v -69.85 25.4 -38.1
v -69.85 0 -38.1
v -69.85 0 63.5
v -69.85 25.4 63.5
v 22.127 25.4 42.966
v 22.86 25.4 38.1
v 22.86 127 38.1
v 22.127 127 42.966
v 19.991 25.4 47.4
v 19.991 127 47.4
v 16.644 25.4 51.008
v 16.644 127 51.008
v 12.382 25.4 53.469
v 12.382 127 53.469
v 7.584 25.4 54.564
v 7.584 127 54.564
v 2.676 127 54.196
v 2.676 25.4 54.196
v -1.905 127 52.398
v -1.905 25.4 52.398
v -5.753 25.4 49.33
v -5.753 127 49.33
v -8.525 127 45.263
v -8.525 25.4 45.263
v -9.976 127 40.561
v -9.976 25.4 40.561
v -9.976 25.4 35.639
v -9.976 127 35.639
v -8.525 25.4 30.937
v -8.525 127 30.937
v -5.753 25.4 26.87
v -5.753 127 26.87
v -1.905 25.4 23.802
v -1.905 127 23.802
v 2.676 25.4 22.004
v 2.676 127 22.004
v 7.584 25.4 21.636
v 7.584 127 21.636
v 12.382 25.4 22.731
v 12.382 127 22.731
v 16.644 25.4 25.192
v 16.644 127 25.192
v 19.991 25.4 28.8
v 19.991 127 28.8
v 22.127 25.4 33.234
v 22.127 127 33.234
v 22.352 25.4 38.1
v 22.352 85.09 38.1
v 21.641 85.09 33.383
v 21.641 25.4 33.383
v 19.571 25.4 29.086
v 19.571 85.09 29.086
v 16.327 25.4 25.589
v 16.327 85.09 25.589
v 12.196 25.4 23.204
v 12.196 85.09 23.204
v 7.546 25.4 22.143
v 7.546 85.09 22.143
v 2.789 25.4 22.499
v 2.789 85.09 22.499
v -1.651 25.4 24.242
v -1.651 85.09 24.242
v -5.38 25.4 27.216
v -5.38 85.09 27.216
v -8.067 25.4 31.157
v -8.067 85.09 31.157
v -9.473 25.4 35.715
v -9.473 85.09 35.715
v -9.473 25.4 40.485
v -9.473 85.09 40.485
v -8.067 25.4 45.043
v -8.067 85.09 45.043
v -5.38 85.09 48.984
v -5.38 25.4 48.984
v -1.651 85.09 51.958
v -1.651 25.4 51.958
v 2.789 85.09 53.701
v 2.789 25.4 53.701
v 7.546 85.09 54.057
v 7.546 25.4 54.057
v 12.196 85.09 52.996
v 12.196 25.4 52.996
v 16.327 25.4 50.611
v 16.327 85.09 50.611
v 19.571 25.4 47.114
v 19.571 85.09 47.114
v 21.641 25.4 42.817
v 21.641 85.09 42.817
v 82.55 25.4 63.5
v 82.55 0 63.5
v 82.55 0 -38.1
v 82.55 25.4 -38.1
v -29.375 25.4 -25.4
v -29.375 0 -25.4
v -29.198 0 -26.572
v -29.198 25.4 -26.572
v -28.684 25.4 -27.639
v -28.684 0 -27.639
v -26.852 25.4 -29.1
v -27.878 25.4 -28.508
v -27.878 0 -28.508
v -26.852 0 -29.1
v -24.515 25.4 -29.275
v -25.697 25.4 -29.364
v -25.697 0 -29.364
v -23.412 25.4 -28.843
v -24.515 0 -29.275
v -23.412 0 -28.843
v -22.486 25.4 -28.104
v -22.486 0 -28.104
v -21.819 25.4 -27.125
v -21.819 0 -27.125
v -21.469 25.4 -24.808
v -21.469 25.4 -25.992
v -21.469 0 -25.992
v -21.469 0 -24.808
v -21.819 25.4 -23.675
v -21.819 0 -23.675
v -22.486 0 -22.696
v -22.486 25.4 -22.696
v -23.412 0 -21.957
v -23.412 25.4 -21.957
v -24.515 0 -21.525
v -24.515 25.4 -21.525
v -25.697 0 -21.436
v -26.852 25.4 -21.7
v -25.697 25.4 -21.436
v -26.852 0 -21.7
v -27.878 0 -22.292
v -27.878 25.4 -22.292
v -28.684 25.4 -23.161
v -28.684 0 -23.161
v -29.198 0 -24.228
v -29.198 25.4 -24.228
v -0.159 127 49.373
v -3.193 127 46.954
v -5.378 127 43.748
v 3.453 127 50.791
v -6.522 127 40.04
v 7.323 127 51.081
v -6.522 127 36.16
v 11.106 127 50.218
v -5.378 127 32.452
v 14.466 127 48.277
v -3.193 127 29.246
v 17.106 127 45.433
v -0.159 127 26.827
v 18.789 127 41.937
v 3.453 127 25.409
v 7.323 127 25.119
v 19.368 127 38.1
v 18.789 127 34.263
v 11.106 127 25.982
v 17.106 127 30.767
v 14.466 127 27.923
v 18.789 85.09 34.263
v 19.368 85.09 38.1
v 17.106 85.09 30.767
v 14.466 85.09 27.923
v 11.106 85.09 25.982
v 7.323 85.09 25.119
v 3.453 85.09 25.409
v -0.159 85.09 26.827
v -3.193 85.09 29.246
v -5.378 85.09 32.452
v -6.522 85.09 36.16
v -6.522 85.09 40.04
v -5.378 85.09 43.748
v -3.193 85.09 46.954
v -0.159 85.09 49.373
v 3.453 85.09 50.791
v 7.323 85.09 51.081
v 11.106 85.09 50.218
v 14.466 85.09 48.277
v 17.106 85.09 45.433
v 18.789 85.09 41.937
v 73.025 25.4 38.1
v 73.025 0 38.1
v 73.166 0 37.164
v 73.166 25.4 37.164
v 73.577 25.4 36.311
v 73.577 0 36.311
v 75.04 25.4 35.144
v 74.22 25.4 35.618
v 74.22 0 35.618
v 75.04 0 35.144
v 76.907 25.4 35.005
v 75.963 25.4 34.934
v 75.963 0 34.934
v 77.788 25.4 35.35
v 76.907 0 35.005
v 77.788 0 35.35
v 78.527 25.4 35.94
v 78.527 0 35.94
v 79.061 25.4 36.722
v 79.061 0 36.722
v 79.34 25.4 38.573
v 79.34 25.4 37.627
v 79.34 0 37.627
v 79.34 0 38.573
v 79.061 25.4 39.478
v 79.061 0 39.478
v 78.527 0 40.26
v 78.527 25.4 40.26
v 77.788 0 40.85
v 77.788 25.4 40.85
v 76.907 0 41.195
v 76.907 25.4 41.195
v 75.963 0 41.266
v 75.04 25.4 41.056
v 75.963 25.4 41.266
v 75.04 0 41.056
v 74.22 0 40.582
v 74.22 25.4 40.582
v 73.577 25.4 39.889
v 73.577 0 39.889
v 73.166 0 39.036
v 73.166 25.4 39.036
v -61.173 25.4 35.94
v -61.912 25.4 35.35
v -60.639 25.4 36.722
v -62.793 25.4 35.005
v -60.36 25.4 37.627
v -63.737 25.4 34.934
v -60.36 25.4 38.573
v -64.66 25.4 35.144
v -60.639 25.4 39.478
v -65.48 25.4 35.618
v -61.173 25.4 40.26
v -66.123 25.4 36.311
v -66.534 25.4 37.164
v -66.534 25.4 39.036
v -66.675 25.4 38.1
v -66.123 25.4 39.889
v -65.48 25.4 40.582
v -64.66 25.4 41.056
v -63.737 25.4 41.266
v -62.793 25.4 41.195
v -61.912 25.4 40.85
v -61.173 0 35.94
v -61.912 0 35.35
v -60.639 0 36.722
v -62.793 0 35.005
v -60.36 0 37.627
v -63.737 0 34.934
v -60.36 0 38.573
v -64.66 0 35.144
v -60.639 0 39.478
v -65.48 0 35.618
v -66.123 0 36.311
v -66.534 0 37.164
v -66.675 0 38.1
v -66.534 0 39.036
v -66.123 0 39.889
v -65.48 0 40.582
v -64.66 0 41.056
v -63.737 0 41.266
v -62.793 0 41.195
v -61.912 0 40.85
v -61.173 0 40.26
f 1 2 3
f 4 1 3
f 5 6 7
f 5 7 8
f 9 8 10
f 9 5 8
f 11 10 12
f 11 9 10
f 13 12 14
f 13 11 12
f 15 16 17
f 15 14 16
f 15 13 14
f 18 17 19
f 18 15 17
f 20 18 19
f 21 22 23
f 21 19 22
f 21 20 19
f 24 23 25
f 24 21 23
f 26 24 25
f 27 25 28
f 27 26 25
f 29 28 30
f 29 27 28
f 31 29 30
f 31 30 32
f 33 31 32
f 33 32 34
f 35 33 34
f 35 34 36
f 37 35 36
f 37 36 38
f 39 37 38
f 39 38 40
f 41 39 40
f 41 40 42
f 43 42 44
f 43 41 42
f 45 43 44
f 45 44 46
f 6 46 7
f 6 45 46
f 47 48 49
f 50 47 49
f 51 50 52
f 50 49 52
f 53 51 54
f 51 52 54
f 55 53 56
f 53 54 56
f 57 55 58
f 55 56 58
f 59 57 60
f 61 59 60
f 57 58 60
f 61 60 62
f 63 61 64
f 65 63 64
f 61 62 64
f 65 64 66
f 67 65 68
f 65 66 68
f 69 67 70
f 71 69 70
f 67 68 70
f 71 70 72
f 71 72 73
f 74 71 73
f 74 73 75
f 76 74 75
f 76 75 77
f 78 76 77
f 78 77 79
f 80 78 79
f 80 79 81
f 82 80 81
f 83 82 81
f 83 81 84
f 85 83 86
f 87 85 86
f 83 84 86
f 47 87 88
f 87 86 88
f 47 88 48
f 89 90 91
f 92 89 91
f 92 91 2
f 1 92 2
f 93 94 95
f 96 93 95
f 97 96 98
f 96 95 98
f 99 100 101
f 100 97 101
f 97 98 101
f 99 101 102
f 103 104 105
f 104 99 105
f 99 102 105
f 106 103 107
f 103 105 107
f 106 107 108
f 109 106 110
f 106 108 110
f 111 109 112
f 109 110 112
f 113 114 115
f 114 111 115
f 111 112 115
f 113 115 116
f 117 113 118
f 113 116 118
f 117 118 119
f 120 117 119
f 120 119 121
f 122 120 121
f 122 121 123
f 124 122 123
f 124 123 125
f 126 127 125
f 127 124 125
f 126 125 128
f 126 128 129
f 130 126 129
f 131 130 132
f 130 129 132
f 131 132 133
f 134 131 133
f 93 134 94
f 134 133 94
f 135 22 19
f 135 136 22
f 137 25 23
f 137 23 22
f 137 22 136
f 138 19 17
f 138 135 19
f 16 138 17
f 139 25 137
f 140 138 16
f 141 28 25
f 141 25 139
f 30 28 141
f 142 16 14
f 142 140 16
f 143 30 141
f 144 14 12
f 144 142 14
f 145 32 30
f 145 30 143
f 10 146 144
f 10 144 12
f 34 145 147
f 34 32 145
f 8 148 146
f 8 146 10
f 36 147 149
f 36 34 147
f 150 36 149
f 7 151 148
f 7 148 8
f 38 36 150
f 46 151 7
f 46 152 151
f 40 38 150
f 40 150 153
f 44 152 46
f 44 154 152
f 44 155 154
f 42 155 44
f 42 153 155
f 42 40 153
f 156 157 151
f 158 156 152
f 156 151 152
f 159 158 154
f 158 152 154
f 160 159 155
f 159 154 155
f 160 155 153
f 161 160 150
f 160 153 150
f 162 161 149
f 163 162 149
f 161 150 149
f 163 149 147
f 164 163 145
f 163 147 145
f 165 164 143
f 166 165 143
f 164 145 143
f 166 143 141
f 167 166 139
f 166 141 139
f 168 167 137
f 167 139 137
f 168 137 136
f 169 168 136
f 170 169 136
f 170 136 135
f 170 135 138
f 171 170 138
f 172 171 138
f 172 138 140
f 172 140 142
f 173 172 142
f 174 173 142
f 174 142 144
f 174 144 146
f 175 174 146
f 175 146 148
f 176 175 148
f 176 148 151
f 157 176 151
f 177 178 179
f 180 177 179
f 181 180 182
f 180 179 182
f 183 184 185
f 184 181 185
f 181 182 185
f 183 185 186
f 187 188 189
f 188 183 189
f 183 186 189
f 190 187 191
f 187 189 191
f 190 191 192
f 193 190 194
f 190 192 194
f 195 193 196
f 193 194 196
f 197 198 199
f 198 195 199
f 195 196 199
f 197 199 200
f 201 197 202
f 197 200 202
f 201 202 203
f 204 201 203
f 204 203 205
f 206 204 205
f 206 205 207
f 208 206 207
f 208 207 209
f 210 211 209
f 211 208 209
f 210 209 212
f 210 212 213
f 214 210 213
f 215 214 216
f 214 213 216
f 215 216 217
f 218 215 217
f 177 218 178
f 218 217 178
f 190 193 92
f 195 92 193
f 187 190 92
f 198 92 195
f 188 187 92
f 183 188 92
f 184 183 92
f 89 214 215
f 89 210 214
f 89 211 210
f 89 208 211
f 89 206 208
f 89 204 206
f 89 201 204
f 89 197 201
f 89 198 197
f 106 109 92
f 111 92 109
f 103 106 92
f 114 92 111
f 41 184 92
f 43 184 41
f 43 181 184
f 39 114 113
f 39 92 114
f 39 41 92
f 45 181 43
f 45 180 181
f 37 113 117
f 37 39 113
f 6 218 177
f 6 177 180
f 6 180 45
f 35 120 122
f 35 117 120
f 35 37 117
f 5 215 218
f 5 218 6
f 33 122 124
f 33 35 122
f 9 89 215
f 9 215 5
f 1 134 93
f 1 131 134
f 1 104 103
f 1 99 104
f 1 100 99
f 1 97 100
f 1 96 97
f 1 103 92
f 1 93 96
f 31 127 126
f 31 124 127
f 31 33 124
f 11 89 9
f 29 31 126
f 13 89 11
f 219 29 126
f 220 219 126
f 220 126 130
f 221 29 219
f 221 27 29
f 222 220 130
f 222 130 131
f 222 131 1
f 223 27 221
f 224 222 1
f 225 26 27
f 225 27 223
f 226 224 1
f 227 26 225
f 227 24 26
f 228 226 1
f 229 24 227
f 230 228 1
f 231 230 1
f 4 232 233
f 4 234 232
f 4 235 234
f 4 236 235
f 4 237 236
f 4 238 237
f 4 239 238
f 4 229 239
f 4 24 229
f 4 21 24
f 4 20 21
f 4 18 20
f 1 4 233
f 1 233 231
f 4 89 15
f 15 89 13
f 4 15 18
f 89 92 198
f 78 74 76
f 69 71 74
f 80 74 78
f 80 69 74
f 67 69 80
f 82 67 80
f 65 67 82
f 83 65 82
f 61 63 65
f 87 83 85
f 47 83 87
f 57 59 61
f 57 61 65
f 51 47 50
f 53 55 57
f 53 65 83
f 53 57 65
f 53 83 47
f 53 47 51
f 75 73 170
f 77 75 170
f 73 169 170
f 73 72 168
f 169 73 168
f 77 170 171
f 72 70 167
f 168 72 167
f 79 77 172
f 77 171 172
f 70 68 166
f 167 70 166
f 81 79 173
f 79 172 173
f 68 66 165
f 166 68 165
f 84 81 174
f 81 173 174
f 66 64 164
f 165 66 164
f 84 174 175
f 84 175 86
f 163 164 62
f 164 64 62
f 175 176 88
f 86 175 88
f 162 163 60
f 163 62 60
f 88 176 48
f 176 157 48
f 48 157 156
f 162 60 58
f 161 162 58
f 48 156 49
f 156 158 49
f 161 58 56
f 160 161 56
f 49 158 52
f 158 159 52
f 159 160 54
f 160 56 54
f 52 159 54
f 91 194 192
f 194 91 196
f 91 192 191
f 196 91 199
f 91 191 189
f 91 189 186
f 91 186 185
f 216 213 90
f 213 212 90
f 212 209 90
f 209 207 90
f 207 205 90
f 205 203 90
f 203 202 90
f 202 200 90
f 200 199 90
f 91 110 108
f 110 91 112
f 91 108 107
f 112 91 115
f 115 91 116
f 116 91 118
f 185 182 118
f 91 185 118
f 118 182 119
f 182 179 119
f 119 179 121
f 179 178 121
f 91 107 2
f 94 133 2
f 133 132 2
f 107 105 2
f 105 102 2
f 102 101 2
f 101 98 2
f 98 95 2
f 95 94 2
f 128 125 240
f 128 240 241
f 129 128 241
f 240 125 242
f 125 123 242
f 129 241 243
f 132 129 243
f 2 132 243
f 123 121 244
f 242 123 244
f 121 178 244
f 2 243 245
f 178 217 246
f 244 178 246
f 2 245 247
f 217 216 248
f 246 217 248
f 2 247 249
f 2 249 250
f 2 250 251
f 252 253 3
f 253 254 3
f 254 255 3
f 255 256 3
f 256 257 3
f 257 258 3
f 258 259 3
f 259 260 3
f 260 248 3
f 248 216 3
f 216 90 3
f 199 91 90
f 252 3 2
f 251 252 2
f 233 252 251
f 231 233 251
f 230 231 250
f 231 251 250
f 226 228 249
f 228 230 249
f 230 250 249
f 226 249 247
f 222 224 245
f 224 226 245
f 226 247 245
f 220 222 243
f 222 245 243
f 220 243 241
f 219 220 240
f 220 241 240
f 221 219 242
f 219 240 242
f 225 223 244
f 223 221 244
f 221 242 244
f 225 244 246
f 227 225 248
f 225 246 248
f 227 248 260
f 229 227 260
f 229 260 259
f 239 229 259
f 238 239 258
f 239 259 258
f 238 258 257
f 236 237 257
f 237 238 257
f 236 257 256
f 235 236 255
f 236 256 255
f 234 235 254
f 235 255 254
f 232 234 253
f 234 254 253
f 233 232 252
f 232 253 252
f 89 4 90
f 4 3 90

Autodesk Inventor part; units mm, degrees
ref_plane "YZ Plane" through (0, 0, 0) normal (1, 0, 0) x (0, 1, 0)
ref_plane "XZ Plane" through (0, 0, 0) normal (0, 1, 0) x (-1, 0, 0)
ref_plane "XY Plane" through (0, 0, 0) normal (0, 0, 1) x (1, 0, 0)
sketch "Sketch1" plane through (0, 0, 0) normal (0, 1, 0) x (-1, 0, 0)
  line L0 (69.85, 63.5) -> (-82.55, 63.5)
  line L1 (-82.55, 63.5) -> (-82.55, -38.1)
  line L2 (-82.55, -38.1) -> (69.85, -38.1)
  line L3 (69.85, -38.1) -> (69.85, 63.5)
  circle A0 centre (25.4, -25.4) radius 3.9751
  circle A1 centre (63.5, 38.1) radius 3.175
  circle A2 centre (-76.2, 38.1) radius 3.175
  point P0 (0, 0)
  dimension "d0" = 101.6
  dimension "d1" = 152.4
  dimension "d3" = 38.1
  dimension "d4" = 7.9502
  dimension "d16" = 6.35
  dimension "d17" = 6.35
  dimension "d18" = 25.4
  dimension "d20" = 6.35
  dimension "d21" = 6.35
  dimension "d22" = 44.45
  dimension "d24" = 25.4
  dimension "d26" = 25.4
extrude "Extrusion1" add sketch "Sketch1" along normal blind 25.4
sketch "Sketch2" plane through (0, 25.4, 0) normal (0, 1, 0) x (1, 0, 0)
  circle A0 centre (6.35, -38.1) radius 16.51
  circle A1 centre (76.2, -38.1) radius 3.175 projected
  line L0 (82.55, -63.5) -> (82.55, 38.1) projected
  point P0 (0, 0)
  dimension "d7" = 33.02
  dimension "d25" = 76.2
extrude "Extrusion2" add sketch "Sketch2" along normal blind 101.6 contours A0
sketch "Sketch3" plane through (6.35, 127, 38.1) normal (0, 1, 0) x (1, 0, 0)
  circle A0 centre (0, 0) radius 13.0175
  point P0 (-6.35, 38.1)
  dimension "d10" = 26.035
extrude "Extrusion3" cut sketch "Sketch3" against normal blind 41.91
sketch "Sketch4" plane through (6.35, 85.09, 38.1) normal (0, 1, 0) x (1, 0, 0)
  circle A0 centre (0, 0) radius 16.51 projected
  circle A1 centre (0, 0) radius 16.002
  point P0 (-6.35, 38.1)
  dimension "d13" = 32.004
extrude "Extrusion4" cut sketch "Sketch4" against normal blind 59.69 contours A1
properties part number "Bottom Plate For Side to Side Motion"
